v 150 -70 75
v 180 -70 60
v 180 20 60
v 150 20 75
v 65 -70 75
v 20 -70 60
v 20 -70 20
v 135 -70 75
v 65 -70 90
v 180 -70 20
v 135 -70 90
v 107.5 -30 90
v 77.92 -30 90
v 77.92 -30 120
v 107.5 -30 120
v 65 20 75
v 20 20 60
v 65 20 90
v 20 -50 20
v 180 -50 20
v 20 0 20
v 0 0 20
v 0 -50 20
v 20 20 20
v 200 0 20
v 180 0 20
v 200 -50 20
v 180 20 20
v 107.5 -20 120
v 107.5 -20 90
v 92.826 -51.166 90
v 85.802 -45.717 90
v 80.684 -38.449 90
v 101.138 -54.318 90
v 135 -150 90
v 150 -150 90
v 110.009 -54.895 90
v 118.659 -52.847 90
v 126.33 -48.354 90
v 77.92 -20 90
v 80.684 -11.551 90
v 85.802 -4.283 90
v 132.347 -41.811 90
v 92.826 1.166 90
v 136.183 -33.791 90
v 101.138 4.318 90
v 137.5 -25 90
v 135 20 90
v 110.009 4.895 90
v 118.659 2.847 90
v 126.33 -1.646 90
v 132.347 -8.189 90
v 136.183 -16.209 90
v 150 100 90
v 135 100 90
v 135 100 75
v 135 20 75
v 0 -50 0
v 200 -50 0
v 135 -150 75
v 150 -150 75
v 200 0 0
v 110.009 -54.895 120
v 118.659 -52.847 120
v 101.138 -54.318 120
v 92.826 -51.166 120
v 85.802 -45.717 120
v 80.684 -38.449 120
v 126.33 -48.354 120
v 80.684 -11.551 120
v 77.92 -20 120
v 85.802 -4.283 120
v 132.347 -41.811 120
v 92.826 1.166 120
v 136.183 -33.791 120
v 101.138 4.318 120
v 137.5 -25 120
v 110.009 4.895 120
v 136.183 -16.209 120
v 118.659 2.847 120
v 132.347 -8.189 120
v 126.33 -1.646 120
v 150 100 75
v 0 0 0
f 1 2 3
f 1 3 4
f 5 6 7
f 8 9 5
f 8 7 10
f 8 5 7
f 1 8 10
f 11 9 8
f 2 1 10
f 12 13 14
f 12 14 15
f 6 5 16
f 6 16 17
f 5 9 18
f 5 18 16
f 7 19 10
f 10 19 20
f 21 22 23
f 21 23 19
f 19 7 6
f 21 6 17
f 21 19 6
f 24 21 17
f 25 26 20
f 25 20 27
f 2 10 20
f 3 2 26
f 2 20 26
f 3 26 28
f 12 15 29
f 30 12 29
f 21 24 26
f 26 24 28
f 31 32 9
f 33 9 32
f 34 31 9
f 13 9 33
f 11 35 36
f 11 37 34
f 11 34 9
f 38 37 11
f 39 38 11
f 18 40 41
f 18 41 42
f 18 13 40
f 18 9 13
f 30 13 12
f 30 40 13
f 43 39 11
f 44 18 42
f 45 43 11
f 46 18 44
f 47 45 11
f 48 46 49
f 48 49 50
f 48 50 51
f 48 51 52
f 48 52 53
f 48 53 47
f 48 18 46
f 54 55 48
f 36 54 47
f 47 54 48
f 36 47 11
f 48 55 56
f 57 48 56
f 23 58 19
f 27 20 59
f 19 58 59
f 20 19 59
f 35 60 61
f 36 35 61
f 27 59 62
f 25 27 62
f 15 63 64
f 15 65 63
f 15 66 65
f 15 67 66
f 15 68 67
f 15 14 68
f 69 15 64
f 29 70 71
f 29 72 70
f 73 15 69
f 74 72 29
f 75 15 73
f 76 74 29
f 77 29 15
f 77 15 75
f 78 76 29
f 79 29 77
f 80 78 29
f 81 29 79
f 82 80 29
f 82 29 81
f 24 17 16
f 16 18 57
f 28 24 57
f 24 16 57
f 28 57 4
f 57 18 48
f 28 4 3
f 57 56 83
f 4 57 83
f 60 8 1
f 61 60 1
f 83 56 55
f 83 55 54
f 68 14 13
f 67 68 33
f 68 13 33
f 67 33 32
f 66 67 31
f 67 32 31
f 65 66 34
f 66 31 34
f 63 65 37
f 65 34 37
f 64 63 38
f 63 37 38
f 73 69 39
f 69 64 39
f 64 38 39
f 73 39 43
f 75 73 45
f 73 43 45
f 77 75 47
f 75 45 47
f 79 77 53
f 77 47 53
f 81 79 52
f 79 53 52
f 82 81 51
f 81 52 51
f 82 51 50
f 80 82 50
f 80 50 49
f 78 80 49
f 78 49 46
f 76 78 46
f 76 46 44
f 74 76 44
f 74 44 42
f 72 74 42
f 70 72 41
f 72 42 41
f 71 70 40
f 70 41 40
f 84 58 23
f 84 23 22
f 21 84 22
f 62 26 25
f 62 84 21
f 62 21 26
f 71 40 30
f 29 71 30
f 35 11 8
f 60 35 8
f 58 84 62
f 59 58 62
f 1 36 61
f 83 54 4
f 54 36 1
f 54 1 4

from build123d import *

# Parameters (mm, degrees)
SKETCH_1_W          = 200
SKETCH_1_H          = 50
EXTRUDE_1_DEPTH     = 20
SKETCH_2_W          = 160
SKETCH_2_H          = 90
EXTRUDE_2_DEPTH     = 40
SKETCH_3_W          = 15
SKETCH_3_H          = 15
EXTRUDE_3_DEPTH     = 90
EXTRUDE_START       = -45
SKETCH_5_W          = 15
SKETCH_5_H          = 15
EXTRUDE_4_DEPTH     = 125
SKETCH_6_R          = 30
EXTRUDE_5_DEPTH     = 30
SKETCH_7_W          = 30
SKETCH_7_H          = 5
CUT_EXTRUDE_2_DEPTH = 30


with BuildPart() as part:
    # Эскиз1 → Бобышка-Вытянуть1 (new body)
    with BuildSketch(Plane.XY):
        with Locations((100, -25)):
            Rectangle(SKETCH_1_W, SKETCH_1_H)
    extrude(amount=EXTRUDE_1_DEPTH)

    # Эскиз2 → Бобышка-Вытянуть2 (add)
    with BuildSketch(Plane.XY.offset(20)):
        with Locations((100, -25)):
            Rectangle(SKETCH_2_W, SKETCH_2_H)
    extrude(amount=EXTRUDE_2_DEPTH)

    # Эскиз3 → Бобышка-Вытянуть3 (add)
    with BuildSketch(Plane.XZ.offset(70)):
        Polygon((65, 90), (65, 75), (65, 60), (135, 60), (135, 75), (135, 90), align=None)
        with Locations((142.5, 82.5)):
            Rectangle(SKETCH_3_W, SKETCH_3_H)
        Polygon((135, 75), (135, 60), (180, 60), (150, 75), align=None)
        Polygon((65, 75), (20, 60), (65, 60), align=None)
    extrude(amount=-EXTRUDE_3_DEPTH)

    # Эскиз5 → Бобышка-Вытянуть4 (add, symmetric)
    with BuildSketch(Plane(origin=(0, 20, 0), x_dir=(1, 0, 0), z_dir=(0, 1, 0)).offset(EXTRUDE_START)):
        with Locations((142.5, -82.5)):
            Rectangle(SKETCH_5_W, SKETCH_5_H)
    extrude(amount=EXTRUDE_4_DEPTH, both=True)

    # Эскиз6 → Бобышка-Вытянуть5 (add)
    with BuildSketch(Plane.XY.offset(90)):
        with Locations((107.5, -25)):
            Circle(SKETCH_6_R)
    extrude(amount=EXTRUDE_5_DEPTH)

    # Эскиз7 → Вырез-Вытянуть2 (cut)
    with BuildSketch(Plane.XY.offset(120)):
        with Locations((92.5, -27.5)):
            Rectangle(SKETCH_7_W, SKETCH_7_H)
        with Locations((92.5, -22.5)):
            Rectangle(SKETCH_7_W, SKETCH_7_H)
    extrude(amount=-CUT_EXTRUDE_2_DEPTH, mode=Mode.SUBTRACT)


solid = part.part
